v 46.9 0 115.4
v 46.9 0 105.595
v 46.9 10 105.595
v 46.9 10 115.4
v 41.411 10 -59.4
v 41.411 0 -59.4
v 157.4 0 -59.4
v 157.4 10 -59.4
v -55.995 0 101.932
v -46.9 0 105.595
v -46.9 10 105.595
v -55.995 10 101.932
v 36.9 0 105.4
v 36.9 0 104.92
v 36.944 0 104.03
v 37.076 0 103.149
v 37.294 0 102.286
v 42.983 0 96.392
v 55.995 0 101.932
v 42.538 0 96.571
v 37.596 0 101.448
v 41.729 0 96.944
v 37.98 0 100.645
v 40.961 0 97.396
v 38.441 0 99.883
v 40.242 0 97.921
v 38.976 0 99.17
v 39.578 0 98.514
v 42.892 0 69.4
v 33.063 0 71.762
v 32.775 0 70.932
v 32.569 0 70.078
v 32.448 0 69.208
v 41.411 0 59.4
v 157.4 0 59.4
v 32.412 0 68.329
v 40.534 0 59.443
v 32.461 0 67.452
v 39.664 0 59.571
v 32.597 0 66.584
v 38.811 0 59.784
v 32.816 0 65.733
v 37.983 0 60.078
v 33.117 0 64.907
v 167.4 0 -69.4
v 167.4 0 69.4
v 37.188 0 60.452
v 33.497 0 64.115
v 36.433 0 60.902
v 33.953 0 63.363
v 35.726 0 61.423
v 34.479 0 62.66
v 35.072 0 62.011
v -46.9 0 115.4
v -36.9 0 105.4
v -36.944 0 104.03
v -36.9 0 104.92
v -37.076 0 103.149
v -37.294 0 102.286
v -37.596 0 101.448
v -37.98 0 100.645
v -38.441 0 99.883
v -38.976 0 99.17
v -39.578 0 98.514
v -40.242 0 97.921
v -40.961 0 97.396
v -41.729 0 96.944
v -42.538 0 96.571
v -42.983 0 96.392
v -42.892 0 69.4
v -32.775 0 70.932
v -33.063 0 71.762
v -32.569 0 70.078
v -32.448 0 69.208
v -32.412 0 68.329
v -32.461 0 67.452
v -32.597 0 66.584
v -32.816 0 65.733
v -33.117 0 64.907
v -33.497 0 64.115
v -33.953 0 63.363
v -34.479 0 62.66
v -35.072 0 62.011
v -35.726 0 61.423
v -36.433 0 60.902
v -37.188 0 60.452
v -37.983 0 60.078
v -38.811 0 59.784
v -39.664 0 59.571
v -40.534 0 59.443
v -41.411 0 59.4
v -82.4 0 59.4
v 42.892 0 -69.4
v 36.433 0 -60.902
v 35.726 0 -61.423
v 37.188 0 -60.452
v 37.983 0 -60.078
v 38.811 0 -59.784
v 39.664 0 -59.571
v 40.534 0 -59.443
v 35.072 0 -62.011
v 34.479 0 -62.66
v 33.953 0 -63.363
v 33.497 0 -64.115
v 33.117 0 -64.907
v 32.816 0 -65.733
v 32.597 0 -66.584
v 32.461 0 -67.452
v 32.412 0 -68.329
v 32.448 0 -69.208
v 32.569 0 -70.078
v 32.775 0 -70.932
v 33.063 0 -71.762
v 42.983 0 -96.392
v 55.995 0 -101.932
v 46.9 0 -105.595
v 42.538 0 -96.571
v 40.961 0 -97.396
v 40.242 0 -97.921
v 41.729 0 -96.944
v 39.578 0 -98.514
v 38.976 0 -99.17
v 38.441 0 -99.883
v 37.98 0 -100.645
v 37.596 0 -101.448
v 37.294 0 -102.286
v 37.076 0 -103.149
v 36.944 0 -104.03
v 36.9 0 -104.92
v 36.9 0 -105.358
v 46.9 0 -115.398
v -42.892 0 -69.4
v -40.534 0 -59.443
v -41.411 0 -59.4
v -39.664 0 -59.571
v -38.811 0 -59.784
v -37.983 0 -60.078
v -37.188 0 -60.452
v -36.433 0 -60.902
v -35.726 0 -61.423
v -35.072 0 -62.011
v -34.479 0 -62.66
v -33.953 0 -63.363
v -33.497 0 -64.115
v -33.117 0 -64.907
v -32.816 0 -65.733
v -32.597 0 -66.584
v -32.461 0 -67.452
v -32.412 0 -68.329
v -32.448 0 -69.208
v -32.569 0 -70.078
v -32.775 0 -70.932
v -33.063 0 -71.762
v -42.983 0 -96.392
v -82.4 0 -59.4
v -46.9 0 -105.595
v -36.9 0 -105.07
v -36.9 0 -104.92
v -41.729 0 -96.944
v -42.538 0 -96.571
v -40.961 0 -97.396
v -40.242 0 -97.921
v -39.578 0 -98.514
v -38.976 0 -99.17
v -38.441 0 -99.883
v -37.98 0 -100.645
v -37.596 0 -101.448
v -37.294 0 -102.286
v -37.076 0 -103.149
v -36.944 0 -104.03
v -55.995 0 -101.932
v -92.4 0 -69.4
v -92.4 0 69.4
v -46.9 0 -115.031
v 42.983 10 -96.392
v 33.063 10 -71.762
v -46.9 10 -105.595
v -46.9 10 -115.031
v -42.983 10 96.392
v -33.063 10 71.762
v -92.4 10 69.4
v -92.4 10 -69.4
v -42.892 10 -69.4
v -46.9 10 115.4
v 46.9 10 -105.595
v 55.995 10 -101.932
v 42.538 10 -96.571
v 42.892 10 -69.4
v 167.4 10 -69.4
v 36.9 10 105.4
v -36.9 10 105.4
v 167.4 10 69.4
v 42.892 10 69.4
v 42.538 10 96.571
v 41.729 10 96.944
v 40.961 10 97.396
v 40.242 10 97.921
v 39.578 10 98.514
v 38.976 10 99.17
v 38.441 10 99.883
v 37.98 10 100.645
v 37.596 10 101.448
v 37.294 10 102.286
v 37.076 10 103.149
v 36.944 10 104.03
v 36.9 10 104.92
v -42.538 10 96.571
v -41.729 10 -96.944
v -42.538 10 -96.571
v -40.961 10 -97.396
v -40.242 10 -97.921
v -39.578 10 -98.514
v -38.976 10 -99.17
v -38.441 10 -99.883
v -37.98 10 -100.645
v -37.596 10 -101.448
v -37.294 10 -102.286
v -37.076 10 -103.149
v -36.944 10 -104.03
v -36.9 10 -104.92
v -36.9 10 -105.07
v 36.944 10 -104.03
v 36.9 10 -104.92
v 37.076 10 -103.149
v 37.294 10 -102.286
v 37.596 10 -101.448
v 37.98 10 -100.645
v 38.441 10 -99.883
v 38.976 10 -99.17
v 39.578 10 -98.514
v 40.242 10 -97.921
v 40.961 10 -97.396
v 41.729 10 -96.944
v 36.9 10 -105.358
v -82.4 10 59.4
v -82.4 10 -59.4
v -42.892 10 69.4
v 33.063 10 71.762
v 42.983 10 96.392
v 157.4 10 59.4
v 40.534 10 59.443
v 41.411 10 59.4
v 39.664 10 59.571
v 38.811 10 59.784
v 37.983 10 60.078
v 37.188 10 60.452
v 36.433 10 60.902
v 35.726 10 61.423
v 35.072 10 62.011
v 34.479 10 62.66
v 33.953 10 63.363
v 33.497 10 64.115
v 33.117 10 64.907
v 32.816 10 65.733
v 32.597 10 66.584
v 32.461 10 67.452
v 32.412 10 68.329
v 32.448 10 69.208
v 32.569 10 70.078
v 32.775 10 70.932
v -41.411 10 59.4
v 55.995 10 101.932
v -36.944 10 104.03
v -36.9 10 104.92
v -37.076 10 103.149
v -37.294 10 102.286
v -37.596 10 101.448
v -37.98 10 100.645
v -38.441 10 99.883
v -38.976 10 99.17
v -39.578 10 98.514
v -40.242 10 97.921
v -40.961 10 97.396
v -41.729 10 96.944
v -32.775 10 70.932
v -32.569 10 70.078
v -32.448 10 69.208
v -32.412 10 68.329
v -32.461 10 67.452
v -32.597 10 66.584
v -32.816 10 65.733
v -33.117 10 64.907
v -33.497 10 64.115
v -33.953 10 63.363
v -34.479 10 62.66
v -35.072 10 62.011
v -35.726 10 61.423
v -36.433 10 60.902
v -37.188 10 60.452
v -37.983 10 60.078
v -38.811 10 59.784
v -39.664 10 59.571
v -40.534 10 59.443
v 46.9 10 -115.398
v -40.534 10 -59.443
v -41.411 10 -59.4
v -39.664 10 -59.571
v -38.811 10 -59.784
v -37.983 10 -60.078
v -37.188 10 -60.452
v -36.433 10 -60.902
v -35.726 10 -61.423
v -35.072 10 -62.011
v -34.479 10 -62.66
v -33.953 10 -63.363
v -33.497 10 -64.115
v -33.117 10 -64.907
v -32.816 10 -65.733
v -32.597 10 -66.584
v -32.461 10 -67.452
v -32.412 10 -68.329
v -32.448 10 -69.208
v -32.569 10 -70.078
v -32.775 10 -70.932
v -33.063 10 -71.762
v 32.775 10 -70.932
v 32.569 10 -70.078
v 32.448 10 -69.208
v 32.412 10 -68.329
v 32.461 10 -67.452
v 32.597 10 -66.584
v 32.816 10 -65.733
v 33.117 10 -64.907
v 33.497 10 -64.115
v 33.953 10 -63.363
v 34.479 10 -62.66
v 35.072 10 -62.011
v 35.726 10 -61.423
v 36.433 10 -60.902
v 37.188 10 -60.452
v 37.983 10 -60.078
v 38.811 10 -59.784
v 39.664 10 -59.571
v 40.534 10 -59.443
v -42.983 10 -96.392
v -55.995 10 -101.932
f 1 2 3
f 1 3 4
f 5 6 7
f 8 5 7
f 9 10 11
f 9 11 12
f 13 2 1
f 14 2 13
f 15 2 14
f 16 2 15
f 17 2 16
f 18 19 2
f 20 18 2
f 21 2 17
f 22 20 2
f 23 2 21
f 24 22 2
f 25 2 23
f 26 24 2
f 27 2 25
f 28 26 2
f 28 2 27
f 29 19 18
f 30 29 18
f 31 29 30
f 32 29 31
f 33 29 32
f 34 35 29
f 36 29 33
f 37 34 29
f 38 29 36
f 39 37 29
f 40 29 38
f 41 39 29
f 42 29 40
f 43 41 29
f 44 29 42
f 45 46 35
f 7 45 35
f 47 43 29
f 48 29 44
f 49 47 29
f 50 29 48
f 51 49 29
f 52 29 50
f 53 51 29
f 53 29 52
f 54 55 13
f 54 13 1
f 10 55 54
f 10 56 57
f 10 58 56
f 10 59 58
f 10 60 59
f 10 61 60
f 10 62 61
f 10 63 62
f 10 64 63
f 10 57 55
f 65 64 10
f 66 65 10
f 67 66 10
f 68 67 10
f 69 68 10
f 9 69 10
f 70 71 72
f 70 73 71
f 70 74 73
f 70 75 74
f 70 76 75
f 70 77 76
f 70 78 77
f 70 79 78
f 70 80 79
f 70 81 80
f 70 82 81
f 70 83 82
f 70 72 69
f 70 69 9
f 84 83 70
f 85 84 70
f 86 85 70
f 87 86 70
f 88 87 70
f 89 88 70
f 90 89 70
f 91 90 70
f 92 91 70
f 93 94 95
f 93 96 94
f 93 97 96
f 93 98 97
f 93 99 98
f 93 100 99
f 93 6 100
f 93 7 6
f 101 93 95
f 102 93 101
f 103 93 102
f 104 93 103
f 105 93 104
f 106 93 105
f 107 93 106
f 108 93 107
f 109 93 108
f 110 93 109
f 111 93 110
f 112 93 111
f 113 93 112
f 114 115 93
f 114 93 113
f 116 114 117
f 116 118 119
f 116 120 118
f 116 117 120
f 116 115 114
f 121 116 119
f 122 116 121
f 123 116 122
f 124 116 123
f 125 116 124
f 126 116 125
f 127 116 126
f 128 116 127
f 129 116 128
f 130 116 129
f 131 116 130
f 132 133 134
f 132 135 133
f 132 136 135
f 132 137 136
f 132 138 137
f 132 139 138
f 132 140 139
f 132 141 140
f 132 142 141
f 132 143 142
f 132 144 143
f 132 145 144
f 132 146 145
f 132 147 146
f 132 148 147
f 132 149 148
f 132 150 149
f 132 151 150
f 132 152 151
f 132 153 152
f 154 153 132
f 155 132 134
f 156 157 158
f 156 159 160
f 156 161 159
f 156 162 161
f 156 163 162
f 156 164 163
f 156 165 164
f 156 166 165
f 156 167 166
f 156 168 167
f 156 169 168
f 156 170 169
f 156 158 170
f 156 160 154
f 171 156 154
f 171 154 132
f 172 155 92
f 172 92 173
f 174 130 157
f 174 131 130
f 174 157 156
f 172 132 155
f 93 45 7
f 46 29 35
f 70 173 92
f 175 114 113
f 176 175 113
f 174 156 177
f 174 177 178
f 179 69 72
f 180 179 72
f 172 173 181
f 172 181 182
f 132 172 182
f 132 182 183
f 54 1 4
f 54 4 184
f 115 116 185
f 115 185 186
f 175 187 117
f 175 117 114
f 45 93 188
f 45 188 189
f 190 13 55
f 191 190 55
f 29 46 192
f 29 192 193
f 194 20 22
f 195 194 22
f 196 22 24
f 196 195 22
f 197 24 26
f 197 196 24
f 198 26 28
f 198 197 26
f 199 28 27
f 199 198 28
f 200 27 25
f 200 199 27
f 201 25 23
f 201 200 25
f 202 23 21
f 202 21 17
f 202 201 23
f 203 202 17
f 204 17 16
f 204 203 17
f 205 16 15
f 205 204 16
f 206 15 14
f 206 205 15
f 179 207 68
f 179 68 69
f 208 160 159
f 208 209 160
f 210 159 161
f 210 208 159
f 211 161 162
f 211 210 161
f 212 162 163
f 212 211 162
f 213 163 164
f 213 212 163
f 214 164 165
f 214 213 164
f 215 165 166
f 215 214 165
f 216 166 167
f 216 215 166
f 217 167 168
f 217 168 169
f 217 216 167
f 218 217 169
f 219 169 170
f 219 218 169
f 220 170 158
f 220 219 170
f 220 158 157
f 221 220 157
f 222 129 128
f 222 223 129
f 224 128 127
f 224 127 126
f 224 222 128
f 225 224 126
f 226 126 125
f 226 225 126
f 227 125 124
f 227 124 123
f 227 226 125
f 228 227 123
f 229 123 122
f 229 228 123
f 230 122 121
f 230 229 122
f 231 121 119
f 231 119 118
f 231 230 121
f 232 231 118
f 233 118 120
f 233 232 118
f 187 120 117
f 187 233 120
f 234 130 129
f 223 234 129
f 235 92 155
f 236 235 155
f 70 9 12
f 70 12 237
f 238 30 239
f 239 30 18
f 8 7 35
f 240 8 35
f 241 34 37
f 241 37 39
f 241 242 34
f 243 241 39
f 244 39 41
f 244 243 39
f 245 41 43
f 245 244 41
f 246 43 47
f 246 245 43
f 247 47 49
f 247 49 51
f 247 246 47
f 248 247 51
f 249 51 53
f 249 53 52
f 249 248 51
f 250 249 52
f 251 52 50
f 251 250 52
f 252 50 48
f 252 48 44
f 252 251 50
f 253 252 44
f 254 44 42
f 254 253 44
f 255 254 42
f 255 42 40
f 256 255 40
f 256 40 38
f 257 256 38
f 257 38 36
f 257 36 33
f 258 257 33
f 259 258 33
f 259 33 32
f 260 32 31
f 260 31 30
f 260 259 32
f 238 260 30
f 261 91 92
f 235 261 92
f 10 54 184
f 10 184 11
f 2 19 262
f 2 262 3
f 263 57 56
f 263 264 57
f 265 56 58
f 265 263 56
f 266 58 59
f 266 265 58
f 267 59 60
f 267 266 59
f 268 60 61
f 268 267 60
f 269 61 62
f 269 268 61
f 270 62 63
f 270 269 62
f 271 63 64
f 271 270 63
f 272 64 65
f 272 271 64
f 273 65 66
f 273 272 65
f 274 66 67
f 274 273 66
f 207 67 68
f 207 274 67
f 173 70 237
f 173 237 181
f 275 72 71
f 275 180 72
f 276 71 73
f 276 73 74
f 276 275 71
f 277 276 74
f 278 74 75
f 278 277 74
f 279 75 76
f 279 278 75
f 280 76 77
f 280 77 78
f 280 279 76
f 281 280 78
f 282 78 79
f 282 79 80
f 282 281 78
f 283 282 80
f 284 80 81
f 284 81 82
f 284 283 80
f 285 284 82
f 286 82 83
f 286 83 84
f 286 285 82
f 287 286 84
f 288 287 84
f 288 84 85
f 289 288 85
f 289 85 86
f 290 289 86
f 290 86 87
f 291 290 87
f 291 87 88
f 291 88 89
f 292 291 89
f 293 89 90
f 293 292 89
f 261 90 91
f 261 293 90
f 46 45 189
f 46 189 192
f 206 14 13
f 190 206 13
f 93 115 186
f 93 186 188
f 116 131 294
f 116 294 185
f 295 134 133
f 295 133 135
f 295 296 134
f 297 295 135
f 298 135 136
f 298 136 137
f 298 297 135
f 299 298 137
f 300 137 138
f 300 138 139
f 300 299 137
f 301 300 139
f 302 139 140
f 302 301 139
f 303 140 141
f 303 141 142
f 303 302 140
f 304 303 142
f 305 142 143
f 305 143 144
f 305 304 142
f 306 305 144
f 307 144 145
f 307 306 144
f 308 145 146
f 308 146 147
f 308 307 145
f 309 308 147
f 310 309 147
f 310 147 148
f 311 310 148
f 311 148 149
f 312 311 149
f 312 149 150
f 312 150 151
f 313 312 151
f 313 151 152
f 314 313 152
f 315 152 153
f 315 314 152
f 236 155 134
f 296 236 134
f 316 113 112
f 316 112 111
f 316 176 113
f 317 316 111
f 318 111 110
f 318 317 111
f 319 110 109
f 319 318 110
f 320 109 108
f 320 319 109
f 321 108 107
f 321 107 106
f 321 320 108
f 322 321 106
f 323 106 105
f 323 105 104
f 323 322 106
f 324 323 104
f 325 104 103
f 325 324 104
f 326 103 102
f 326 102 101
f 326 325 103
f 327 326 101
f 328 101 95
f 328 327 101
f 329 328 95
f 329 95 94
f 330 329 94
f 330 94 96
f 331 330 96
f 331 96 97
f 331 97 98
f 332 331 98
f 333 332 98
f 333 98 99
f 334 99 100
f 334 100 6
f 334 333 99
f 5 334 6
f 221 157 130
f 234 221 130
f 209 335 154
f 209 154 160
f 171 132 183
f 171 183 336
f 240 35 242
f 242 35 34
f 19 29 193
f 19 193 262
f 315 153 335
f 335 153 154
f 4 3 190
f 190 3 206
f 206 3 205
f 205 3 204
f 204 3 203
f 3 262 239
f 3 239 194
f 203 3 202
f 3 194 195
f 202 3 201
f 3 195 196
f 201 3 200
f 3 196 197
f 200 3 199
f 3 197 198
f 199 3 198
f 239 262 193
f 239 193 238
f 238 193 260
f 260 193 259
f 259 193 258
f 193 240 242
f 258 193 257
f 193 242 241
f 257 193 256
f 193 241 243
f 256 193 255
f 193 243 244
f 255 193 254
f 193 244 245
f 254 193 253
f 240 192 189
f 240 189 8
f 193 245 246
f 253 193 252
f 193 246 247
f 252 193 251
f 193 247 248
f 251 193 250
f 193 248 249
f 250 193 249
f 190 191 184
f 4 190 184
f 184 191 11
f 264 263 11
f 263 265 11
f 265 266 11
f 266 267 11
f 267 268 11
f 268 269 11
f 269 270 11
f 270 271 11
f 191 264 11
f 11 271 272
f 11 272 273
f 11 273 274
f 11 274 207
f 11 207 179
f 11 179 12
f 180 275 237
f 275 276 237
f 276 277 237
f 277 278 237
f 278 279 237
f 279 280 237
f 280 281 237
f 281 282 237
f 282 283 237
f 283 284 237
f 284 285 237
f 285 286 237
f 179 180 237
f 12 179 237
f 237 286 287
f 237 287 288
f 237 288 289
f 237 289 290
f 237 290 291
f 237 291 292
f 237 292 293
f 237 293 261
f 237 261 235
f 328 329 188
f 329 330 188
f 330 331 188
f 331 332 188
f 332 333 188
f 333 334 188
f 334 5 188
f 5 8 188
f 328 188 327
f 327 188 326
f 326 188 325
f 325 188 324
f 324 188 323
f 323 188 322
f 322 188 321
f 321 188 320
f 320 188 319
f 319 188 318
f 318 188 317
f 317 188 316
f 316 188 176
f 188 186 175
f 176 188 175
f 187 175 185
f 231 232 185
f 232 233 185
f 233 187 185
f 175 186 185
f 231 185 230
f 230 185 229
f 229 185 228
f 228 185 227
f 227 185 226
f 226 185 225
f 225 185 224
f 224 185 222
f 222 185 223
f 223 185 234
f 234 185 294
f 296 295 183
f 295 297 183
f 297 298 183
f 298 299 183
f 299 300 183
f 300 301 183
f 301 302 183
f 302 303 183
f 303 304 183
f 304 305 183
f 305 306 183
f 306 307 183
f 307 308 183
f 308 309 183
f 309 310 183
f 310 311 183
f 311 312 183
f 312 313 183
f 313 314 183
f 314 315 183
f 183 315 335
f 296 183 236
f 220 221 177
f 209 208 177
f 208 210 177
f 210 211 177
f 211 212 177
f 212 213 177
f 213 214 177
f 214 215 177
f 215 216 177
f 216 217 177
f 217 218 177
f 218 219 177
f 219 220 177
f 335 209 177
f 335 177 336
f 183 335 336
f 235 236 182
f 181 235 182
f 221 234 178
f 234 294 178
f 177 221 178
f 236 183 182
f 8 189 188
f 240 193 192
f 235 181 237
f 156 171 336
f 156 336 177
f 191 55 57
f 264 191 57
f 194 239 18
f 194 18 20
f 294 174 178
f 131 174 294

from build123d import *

# Parameters (mm, degrees)
BOSS_EXTRUDE2_DEPTH = 10
FILLET2_R           = 9


with BuildPart() as part:
    # Sketch2 → Boss-Extrude2 (new body)
    with BuildSketch(Plane(origin=(0, 0, 0), x_dir=(1, 0, 0), z_dir=(0, 1, 0))):
        Polygon((-92.4, -69.4), (-92.4, 69.4), (-42.892169593, 69.4), (-55.995137589, 101.931506748), (-46.9, 105.594826054), (-46.9, 115.030994267), (46.9, 115.39765007), (46.9, 105.594826054), (55.995137589, 101.931506748), (42.892169593, 69.4), (167.4, 69.4), (167.4, -69.4), (42.892169593, -69.4), (55.995137589, -101.931506748), (46.9, -105.594826054), (46.9, -115.4), (-46.9, -115.4), (-46.9, -105.594826054), (-55.995137589, -101.931506748), (-42.892169593, -69.4), align=None)
        Polygon((-82.4, -59.4), (-82.4, 59.4), (-28.083714943, 59.4), (-42.983173736, 96.391759761), (-36.9, 98.84192696), (-36.9, 105.070006974), (36.9, 105.358484567), (36.9, 98.84192696), (42.983173736, 96.391759761), (28.083714943, 59.4), (157.4, 59.4), (157.4, -59.4), (28.083714943, -59.4), (42.983173736, -96.391759761), (36.9, -98.84192696), (36.9, -105.4), (-36.9, -105.4), (-36.9, -98.84192696), (-42.983173736, -96.391759761), (-28.083714943, -59.4), align=None, mode=Mode.SUBTRACT)
    extrude(amount=BOSS_EXTRUDE2_DEPTH)

    # Fillet2
    fillet2_edges = [part.edges().sort_by_distance(p)[0] for p in [
        (-28.083714943, 5, 59.4),
        (-36.9, 5, 98.84192696),
        (36.9, 5, 98.84192696),
        (28.083714943, 5, 59.4),
        (28.083714943, 5, -59.4),
        (36.9, 5, -98.84192696),
        (-36.9, 5, -98.84192696),
        (-28.083714943, 5, -59.4),
    ]]
    fillet(fillet2_edges, radius=FILLET2_R)


solid = part.part
